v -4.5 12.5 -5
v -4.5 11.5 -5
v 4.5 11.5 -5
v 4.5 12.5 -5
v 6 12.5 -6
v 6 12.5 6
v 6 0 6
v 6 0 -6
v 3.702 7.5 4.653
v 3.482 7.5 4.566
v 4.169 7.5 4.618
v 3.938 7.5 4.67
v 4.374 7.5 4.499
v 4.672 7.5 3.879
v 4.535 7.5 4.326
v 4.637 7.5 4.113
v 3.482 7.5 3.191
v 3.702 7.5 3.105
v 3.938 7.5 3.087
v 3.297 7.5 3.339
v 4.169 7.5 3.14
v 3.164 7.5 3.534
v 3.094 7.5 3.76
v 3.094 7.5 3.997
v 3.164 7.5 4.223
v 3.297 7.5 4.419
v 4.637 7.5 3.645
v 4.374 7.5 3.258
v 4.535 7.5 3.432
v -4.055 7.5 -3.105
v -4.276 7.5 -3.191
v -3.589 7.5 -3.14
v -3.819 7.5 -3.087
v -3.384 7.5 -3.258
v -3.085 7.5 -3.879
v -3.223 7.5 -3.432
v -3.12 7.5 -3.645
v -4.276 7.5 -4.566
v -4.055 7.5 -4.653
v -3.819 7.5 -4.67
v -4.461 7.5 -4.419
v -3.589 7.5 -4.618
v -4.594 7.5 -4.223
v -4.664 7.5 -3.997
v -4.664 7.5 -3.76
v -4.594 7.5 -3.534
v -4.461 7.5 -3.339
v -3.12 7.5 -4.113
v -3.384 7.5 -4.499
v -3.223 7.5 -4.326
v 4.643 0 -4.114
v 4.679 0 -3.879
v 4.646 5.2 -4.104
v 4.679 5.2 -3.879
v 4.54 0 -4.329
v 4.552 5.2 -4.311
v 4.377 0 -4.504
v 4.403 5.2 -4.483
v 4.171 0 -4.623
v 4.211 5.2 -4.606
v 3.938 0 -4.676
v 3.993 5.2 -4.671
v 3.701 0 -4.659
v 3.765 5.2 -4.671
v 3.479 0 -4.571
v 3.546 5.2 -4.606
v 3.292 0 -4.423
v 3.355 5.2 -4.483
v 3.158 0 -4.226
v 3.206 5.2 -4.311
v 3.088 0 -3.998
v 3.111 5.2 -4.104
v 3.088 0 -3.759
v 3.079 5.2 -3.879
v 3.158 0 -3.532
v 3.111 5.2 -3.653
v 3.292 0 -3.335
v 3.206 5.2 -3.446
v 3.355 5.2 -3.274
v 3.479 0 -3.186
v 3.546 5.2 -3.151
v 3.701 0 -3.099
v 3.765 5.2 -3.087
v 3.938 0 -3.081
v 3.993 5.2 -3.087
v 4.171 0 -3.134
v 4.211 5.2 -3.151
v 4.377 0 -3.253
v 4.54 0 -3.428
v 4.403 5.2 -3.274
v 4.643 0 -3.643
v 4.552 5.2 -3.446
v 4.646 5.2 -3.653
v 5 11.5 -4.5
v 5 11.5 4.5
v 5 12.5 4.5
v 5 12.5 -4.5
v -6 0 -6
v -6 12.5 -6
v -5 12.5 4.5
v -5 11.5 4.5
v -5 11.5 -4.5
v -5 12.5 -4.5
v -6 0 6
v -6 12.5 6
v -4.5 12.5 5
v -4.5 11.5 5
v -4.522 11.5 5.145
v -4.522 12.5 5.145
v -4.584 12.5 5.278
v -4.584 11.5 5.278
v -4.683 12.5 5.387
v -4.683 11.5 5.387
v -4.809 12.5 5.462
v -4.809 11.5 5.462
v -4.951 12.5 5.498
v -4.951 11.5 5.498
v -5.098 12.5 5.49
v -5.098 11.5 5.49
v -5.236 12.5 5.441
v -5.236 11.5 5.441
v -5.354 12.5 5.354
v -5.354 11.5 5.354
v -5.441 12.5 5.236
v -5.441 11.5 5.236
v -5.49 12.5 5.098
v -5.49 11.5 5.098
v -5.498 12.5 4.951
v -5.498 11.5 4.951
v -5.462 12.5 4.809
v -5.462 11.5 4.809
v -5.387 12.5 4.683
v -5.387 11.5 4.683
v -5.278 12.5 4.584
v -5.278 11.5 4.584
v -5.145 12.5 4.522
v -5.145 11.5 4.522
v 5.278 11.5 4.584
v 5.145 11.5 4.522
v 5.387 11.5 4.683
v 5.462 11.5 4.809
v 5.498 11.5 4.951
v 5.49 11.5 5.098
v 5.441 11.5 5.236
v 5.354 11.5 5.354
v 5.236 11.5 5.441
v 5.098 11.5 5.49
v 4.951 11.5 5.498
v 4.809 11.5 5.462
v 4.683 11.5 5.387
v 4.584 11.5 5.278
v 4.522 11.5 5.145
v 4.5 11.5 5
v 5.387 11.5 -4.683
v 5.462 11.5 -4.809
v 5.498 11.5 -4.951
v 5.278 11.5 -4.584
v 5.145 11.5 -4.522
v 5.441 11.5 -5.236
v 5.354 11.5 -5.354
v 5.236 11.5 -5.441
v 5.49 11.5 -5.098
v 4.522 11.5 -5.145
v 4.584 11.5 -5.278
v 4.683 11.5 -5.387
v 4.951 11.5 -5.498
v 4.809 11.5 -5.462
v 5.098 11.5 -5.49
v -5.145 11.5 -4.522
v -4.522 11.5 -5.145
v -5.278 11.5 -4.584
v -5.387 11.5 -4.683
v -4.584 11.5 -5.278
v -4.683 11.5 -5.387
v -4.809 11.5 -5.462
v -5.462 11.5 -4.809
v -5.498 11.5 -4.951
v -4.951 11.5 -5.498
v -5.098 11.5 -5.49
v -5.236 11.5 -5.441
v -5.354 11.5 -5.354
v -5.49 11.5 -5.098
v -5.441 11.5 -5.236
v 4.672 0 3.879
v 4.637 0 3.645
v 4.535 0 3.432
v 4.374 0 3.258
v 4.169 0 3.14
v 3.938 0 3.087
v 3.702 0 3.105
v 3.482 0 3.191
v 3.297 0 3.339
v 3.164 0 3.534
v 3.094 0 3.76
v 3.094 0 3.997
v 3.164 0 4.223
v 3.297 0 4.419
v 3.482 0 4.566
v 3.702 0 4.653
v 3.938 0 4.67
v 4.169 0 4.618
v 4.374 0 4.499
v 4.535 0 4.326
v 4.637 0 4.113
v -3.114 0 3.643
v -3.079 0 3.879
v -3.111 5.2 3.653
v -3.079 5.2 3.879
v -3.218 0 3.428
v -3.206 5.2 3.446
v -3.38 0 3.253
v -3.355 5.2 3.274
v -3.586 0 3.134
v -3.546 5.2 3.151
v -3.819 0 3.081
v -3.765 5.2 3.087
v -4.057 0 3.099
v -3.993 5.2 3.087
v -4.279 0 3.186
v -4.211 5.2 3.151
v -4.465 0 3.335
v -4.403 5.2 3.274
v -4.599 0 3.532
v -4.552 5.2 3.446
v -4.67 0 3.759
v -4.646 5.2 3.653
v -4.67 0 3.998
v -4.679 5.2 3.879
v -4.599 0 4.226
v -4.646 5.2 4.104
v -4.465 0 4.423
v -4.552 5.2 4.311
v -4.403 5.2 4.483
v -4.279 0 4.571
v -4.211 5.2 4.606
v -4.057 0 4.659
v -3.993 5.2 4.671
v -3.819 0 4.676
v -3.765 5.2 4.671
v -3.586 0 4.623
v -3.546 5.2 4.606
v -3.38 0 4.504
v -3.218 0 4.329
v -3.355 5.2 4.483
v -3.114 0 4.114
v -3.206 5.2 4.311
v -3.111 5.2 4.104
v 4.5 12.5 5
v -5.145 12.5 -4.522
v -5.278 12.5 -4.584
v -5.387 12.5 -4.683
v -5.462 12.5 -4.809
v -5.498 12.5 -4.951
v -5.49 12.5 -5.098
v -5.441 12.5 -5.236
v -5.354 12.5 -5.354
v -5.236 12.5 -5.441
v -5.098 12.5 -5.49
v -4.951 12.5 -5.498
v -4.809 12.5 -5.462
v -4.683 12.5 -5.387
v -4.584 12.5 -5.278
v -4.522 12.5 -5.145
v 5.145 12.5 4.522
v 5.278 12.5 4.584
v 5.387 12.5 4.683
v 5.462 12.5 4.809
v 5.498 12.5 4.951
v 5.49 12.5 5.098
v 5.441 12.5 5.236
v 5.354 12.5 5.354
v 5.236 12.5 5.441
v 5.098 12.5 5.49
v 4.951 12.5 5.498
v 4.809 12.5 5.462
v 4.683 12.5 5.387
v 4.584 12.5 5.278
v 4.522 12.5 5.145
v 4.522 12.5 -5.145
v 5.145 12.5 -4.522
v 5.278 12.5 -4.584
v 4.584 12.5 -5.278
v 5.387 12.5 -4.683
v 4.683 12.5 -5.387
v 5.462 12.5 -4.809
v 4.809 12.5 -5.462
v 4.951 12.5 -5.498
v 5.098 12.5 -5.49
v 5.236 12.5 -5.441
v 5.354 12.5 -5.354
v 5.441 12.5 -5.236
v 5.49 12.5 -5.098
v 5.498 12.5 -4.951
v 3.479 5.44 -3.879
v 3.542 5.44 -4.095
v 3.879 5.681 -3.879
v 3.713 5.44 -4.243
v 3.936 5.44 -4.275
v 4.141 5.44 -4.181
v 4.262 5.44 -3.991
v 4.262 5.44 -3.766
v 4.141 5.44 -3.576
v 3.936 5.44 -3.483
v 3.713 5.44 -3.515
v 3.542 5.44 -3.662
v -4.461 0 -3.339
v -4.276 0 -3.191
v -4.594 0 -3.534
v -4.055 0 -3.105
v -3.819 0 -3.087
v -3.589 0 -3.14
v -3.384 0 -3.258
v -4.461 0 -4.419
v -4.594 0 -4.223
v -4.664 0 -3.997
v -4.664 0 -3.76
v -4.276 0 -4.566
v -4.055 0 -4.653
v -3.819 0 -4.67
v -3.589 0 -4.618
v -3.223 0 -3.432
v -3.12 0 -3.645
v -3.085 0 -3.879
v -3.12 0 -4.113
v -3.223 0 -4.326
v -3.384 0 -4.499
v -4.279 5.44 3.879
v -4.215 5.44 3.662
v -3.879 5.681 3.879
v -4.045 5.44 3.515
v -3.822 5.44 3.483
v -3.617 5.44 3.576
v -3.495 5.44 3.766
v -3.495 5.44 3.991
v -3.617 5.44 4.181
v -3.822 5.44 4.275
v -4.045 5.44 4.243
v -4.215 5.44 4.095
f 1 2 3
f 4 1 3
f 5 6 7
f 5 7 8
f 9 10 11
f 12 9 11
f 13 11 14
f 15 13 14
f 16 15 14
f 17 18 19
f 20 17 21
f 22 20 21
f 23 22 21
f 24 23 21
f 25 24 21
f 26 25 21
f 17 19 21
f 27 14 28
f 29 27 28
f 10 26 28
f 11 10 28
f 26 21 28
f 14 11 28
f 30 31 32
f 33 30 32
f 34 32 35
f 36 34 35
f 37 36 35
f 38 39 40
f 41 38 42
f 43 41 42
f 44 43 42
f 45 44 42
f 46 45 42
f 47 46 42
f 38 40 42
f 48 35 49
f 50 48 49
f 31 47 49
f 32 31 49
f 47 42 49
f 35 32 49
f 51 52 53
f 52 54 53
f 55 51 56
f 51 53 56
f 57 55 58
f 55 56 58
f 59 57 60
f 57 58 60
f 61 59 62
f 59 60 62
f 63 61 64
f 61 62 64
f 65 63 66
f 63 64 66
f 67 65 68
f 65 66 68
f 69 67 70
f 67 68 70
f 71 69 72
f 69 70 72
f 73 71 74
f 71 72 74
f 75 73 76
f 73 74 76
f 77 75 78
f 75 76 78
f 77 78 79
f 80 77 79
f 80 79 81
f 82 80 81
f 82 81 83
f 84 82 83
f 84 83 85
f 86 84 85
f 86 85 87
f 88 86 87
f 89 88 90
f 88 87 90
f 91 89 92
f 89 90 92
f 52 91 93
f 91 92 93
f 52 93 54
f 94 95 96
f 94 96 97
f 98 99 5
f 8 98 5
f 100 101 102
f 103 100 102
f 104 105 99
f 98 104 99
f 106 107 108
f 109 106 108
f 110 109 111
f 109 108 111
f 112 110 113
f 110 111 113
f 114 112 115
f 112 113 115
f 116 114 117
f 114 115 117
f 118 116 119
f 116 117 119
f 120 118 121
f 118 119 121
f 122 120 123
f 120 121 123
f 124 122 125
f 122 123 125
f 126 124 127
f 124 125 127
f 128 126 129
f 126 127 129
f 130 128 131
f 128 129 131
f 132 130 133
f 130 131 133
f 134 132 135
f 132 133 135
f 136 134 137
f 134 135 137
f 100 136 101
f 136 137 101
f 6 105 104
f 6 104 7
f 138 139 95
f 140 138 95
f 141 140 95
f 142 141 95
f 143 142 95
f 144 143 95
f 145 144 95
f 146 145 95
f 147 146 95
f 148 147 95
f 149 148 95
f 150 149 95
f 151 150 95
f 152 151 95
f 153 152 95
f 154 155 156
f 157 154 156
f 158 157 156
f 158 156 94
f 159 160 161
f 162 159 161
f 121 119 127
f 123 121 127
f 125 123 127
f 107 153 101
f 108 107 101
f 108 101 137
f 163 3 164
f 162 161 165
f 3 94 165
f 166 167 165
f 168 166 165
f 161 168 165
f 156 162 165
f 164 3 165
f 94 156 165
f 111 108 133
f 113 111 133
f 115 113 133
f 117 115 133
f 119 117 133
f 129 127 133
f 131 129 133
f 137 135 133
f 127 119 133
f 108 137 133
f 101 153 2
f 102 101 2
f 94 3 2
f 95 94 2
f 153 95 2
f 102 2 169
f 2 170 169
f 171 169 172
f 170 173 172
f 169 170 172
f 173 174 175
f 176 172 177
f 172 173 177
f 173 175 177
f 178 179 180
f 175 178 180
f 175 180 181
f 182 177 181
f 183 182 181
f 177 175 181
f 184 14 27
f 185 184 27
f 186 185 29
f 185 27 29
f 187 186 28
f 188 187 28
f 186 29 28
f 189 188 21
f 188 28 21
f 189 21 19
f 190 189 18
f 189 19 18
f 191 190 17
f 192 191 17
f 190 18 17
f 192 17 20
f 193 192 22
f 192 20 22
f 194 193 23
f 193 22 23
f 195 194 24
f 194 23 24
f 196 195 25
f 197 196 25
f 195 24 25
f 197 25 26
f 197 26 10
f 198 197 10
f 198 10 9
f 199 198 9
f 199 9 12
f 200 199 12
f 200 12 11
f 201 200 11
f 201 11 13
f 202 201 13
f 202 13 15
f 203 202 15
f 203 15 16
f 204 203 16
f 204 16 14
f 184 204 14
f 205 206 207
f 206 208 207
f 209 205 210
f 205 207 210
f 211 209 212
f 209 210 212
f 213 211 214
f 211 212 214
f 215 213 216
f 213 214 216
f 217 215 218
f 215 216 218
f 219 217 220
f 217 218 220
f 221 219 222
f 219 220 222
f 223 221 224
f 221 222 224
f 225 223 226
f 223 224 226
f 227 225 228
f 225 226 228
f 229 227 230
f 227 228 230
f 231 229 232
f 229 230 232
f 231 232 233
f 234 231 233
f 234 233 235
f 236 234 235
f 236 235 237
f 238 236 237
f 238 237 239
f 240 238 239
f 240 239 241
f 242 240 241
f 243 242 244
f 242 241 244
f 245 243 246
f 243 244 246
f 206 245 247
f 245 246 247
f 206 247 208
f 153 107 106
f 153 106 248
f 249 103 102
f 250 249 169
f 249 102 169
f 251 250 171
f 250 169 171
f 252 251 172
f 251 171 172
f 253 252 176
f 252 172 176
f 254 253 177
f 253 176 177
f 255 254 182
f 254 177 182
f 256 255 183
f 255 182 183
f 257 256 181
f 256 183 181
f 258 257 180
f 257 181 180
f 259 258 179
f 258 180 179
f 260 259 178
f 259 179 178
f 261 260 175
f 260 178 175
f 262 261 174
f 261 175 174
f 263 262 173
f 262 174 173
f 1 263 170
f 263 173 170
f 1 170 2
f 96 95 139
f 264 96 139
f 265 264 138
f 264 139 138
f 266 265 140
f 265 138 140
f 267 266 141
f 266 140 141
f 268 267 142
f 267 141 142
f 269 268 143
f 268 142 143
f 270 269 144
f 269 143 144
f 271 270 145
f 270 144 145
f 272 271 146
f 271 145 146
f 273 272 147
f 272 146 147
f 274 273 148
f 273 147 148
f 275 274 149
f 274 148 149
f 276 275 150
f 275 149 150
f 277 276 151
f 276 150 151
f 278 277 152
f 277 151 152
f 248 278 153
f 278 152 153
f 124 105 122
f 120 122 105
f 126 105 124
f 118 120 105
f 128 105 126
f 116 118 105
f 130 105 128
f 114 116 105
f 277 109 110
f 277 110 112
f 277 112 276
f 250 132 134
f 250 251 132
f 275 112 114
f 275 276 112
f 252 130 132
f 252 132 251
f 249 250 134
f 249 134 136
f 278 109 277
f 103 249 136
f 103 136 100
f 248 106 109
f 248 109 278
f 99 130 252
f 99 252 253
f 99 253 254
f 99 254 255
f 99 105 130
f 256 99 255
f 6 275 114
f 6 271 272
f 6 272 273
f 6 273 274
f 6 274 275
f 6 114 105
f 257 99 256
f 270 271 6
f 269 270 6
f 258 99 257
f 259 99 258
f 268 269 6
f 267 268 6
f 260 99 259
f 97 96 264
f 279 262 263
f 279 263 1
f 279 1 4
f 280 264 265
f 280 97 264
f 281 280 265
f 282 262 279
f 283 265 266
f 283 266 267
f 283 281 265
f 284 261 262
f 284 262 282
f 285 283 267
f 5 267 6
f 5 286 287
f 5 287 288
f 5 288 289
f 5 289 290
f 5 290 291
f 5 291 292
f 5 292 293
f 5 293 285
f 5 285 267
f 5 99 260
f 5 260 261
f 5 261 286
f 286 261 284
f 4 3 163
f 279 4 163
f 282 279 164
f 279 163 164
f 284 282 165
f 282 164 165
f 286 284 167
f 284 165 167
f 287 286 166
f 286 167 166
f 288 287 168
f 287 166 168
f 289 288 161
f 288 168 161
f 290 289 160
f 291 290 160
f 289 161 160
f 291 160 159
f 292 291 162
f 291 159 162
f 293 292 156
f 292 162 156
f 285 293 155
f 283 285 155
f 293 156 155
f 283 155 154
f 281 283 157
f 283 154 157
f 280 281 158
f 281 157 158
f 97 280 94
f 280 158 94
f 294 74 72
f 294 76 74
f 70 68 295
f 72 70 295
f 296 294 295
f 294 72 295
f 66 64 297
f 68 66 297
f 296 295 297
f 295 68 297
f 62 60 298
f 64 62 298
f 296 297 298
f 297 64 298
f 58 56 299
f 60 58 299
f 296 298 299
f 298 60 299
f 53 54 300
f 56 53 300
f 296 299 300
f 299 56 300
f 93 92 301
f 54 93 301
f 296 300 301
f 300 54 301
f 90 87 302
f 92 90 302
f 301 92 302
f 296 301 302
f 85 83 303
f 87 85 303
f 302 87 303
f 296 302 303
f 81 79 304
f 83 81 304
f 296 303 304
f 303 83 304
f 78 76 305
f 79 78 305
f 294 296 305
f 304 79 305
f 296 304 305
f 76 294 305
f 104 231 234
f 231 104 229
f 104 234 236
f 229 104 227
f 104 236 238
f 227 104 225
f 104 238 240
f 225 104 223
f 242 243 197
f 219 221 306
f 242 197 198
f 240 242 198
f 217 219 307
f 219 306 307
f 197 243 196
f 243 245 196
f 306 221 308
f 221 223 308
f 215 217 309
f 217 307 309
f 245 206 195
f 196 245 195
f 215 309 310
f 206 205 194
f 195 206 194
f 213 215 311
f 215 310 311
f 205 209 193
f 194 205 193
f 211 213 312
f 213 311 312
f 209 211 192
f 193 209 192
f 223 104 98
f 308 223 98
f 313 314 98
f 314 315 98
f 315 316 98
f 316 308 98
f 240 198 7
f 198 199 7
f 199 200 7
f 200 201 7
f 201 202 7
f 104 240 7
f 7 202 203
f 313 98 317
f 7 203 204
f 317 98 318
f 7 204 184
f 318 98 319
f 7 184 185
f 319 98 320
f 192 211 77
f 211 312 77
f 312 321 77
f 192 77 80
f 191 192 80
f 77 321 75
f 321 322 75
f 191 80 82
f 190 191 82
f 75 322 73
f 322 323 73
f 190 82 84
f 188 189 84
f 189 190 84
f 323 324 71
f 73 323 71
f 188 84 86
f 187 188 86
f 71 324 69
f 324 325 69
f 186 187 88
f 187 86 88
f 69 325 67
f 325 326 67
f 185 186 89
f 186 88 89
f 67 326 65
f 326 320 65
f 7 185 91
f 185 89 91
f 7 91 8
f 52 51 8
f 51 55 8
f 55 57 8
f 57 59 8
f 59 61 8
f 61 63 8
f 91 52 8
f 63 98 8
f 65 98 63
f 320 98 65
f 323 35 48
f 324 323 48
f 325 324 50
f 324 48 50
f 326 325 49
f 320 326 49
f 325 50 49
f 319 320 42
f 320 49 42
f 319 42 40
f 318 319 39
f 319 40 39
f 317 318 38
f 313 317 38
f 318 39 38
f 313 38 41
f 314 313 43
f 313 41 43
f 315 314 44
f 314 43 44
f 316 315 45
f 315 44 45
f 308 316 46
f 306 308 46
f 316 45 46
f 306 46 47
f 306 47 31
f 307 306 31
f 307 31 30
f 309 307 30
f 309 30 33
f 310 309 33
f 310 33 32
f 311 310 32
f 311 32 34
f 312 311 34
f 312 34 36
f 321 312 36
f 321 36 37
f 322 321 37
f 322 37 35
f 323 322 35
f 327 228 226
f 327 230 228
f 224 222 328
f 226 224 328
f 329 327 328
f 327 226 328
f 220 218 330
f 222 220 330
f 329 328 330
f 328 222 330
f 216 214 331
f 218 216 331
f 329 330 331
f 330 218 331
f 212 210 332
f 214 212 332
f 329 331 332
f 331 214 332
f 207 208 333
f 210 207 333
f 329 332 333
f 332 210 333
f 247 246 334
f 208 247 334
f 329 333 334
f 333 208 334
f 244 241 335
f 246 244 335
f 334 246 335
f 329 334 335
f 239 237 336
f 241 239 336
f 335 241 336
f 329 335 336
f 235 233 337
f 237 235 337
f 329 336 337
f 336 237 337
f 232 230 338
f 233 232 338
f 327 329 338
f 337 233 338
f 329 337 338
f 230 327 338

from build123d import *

# Parameters (mm, degrees)
SKETCH1_W                          = 12
SKETCH1_H                          = 12
BOSS_EXTRUDE1_DEPTH                = 11.5
SKETCH2_W                          = 12
SKETCH2_H                          = 12
SKETCH2_W_2                        = 10
SKETCH2_H_2                        = 10
BOSS_EXTRUDE2_DEPTH                = 1
F_1_0MM_DOWEL_HOLE1_D              = 1
F_1_0MM_DOWEL_HOLE1_DEPTH          = 1
F_1_16_0_0625_DIAMETER_HOLE1_D     = 1.5875
F_1_16_0_0625_DIAMETER_HOLE1_DEPTH = 7.5
M2X0_4_TAPPED_HOLE1_D              = 1.6
M2X0_4_TAPPED_HOLE1_DEPTH          = 5.2
M2X0_4_TAPPED_HOLE1_TIP            = 0.480688495


with BuildPart() as part:
    # Sketch1 → Boss-Extrude1 (new body)
    with BuildSketch(Plane(origin=(0, 0, 0), x_dir=(1, 0, 0), z_dir=(0, 1, 0))):
        Rectangle(SKETCH1_W, SKETCH1_H)
    extrude(amount=BOSS_EXTRUDE1_DEPTH)

    # Sketch2 → Boss-Extrude2 (add)
    with BuildSketch(Plane(origin=(0, 11.5, 0), x_dir=(1, 0, 0), z_dir=(0, 1, 0))):
        Rectangle(SKETCH2_W, SKETCH2_H)
        Rectangle(SKETCH2_W_2, SKETCH2_H_2, mode=Mode.SUBTRACT)
    extrude(amount=BOSS_EXTRUDE2_DEPTH)

    # Ø1.0mm Dowel Hole1
    with Locations(Plane(origin=(0, 12.5, 0), x_dir=(1, 0, 0), z_dir=(0, 1, 0))):
        with Locations((-5, 5), (5, 5), (5, -5), (-5, -5)):
            Hole(F_1_0MM_DOWEL_HOLE1_D / 2, depth=F_1_0MM_DOWEL_HOLE1_DEPTH)

    # 1/16 (0.0625) Diameter Hole1
    with Locations(Plane(origin=(0, 0, 0), x_dir=(-1, 0, 0), z_dir=(0, -1, 0))):
        with Locations((3.878679656, 3.878679656), (-3.878679656, -3.878679656)):
            Hole(F_1_16_0_0625_DIAMETER_HOLE1_D / 2, depth=F_1_16_0_0625_DIAMETER_HOLE1_DEPTH)

    # M2x0.4 Tapped Hole1
    with Locations(Plane(origin=(0, 0, 0), x_dir=(-1, 0, 0), z_dir=(0, -1, 0))):
        with Locations((3.878679656, -3.878679656), (-3.878679656, 3.878679656)):
            Hole(M2X0_4_TAPPED_HOLE1_D / 2, depth=M2X0_4_TAPPED_HOLE1_DEPTH)
            with Locations((0, 0, -(M2X0_4_TAPPED_HOLE1_DEPTH + M2X0_4_TAPPED_HOLE1_TIP / 2))):  # 118° drill point
                Cone(0, M2X0_4_TAPPED_HOLE1_D / 2, M2X0_4_TAPPED_HOLE1_TIP, mode=Mode.SUBTRACT)


solid = part.part
